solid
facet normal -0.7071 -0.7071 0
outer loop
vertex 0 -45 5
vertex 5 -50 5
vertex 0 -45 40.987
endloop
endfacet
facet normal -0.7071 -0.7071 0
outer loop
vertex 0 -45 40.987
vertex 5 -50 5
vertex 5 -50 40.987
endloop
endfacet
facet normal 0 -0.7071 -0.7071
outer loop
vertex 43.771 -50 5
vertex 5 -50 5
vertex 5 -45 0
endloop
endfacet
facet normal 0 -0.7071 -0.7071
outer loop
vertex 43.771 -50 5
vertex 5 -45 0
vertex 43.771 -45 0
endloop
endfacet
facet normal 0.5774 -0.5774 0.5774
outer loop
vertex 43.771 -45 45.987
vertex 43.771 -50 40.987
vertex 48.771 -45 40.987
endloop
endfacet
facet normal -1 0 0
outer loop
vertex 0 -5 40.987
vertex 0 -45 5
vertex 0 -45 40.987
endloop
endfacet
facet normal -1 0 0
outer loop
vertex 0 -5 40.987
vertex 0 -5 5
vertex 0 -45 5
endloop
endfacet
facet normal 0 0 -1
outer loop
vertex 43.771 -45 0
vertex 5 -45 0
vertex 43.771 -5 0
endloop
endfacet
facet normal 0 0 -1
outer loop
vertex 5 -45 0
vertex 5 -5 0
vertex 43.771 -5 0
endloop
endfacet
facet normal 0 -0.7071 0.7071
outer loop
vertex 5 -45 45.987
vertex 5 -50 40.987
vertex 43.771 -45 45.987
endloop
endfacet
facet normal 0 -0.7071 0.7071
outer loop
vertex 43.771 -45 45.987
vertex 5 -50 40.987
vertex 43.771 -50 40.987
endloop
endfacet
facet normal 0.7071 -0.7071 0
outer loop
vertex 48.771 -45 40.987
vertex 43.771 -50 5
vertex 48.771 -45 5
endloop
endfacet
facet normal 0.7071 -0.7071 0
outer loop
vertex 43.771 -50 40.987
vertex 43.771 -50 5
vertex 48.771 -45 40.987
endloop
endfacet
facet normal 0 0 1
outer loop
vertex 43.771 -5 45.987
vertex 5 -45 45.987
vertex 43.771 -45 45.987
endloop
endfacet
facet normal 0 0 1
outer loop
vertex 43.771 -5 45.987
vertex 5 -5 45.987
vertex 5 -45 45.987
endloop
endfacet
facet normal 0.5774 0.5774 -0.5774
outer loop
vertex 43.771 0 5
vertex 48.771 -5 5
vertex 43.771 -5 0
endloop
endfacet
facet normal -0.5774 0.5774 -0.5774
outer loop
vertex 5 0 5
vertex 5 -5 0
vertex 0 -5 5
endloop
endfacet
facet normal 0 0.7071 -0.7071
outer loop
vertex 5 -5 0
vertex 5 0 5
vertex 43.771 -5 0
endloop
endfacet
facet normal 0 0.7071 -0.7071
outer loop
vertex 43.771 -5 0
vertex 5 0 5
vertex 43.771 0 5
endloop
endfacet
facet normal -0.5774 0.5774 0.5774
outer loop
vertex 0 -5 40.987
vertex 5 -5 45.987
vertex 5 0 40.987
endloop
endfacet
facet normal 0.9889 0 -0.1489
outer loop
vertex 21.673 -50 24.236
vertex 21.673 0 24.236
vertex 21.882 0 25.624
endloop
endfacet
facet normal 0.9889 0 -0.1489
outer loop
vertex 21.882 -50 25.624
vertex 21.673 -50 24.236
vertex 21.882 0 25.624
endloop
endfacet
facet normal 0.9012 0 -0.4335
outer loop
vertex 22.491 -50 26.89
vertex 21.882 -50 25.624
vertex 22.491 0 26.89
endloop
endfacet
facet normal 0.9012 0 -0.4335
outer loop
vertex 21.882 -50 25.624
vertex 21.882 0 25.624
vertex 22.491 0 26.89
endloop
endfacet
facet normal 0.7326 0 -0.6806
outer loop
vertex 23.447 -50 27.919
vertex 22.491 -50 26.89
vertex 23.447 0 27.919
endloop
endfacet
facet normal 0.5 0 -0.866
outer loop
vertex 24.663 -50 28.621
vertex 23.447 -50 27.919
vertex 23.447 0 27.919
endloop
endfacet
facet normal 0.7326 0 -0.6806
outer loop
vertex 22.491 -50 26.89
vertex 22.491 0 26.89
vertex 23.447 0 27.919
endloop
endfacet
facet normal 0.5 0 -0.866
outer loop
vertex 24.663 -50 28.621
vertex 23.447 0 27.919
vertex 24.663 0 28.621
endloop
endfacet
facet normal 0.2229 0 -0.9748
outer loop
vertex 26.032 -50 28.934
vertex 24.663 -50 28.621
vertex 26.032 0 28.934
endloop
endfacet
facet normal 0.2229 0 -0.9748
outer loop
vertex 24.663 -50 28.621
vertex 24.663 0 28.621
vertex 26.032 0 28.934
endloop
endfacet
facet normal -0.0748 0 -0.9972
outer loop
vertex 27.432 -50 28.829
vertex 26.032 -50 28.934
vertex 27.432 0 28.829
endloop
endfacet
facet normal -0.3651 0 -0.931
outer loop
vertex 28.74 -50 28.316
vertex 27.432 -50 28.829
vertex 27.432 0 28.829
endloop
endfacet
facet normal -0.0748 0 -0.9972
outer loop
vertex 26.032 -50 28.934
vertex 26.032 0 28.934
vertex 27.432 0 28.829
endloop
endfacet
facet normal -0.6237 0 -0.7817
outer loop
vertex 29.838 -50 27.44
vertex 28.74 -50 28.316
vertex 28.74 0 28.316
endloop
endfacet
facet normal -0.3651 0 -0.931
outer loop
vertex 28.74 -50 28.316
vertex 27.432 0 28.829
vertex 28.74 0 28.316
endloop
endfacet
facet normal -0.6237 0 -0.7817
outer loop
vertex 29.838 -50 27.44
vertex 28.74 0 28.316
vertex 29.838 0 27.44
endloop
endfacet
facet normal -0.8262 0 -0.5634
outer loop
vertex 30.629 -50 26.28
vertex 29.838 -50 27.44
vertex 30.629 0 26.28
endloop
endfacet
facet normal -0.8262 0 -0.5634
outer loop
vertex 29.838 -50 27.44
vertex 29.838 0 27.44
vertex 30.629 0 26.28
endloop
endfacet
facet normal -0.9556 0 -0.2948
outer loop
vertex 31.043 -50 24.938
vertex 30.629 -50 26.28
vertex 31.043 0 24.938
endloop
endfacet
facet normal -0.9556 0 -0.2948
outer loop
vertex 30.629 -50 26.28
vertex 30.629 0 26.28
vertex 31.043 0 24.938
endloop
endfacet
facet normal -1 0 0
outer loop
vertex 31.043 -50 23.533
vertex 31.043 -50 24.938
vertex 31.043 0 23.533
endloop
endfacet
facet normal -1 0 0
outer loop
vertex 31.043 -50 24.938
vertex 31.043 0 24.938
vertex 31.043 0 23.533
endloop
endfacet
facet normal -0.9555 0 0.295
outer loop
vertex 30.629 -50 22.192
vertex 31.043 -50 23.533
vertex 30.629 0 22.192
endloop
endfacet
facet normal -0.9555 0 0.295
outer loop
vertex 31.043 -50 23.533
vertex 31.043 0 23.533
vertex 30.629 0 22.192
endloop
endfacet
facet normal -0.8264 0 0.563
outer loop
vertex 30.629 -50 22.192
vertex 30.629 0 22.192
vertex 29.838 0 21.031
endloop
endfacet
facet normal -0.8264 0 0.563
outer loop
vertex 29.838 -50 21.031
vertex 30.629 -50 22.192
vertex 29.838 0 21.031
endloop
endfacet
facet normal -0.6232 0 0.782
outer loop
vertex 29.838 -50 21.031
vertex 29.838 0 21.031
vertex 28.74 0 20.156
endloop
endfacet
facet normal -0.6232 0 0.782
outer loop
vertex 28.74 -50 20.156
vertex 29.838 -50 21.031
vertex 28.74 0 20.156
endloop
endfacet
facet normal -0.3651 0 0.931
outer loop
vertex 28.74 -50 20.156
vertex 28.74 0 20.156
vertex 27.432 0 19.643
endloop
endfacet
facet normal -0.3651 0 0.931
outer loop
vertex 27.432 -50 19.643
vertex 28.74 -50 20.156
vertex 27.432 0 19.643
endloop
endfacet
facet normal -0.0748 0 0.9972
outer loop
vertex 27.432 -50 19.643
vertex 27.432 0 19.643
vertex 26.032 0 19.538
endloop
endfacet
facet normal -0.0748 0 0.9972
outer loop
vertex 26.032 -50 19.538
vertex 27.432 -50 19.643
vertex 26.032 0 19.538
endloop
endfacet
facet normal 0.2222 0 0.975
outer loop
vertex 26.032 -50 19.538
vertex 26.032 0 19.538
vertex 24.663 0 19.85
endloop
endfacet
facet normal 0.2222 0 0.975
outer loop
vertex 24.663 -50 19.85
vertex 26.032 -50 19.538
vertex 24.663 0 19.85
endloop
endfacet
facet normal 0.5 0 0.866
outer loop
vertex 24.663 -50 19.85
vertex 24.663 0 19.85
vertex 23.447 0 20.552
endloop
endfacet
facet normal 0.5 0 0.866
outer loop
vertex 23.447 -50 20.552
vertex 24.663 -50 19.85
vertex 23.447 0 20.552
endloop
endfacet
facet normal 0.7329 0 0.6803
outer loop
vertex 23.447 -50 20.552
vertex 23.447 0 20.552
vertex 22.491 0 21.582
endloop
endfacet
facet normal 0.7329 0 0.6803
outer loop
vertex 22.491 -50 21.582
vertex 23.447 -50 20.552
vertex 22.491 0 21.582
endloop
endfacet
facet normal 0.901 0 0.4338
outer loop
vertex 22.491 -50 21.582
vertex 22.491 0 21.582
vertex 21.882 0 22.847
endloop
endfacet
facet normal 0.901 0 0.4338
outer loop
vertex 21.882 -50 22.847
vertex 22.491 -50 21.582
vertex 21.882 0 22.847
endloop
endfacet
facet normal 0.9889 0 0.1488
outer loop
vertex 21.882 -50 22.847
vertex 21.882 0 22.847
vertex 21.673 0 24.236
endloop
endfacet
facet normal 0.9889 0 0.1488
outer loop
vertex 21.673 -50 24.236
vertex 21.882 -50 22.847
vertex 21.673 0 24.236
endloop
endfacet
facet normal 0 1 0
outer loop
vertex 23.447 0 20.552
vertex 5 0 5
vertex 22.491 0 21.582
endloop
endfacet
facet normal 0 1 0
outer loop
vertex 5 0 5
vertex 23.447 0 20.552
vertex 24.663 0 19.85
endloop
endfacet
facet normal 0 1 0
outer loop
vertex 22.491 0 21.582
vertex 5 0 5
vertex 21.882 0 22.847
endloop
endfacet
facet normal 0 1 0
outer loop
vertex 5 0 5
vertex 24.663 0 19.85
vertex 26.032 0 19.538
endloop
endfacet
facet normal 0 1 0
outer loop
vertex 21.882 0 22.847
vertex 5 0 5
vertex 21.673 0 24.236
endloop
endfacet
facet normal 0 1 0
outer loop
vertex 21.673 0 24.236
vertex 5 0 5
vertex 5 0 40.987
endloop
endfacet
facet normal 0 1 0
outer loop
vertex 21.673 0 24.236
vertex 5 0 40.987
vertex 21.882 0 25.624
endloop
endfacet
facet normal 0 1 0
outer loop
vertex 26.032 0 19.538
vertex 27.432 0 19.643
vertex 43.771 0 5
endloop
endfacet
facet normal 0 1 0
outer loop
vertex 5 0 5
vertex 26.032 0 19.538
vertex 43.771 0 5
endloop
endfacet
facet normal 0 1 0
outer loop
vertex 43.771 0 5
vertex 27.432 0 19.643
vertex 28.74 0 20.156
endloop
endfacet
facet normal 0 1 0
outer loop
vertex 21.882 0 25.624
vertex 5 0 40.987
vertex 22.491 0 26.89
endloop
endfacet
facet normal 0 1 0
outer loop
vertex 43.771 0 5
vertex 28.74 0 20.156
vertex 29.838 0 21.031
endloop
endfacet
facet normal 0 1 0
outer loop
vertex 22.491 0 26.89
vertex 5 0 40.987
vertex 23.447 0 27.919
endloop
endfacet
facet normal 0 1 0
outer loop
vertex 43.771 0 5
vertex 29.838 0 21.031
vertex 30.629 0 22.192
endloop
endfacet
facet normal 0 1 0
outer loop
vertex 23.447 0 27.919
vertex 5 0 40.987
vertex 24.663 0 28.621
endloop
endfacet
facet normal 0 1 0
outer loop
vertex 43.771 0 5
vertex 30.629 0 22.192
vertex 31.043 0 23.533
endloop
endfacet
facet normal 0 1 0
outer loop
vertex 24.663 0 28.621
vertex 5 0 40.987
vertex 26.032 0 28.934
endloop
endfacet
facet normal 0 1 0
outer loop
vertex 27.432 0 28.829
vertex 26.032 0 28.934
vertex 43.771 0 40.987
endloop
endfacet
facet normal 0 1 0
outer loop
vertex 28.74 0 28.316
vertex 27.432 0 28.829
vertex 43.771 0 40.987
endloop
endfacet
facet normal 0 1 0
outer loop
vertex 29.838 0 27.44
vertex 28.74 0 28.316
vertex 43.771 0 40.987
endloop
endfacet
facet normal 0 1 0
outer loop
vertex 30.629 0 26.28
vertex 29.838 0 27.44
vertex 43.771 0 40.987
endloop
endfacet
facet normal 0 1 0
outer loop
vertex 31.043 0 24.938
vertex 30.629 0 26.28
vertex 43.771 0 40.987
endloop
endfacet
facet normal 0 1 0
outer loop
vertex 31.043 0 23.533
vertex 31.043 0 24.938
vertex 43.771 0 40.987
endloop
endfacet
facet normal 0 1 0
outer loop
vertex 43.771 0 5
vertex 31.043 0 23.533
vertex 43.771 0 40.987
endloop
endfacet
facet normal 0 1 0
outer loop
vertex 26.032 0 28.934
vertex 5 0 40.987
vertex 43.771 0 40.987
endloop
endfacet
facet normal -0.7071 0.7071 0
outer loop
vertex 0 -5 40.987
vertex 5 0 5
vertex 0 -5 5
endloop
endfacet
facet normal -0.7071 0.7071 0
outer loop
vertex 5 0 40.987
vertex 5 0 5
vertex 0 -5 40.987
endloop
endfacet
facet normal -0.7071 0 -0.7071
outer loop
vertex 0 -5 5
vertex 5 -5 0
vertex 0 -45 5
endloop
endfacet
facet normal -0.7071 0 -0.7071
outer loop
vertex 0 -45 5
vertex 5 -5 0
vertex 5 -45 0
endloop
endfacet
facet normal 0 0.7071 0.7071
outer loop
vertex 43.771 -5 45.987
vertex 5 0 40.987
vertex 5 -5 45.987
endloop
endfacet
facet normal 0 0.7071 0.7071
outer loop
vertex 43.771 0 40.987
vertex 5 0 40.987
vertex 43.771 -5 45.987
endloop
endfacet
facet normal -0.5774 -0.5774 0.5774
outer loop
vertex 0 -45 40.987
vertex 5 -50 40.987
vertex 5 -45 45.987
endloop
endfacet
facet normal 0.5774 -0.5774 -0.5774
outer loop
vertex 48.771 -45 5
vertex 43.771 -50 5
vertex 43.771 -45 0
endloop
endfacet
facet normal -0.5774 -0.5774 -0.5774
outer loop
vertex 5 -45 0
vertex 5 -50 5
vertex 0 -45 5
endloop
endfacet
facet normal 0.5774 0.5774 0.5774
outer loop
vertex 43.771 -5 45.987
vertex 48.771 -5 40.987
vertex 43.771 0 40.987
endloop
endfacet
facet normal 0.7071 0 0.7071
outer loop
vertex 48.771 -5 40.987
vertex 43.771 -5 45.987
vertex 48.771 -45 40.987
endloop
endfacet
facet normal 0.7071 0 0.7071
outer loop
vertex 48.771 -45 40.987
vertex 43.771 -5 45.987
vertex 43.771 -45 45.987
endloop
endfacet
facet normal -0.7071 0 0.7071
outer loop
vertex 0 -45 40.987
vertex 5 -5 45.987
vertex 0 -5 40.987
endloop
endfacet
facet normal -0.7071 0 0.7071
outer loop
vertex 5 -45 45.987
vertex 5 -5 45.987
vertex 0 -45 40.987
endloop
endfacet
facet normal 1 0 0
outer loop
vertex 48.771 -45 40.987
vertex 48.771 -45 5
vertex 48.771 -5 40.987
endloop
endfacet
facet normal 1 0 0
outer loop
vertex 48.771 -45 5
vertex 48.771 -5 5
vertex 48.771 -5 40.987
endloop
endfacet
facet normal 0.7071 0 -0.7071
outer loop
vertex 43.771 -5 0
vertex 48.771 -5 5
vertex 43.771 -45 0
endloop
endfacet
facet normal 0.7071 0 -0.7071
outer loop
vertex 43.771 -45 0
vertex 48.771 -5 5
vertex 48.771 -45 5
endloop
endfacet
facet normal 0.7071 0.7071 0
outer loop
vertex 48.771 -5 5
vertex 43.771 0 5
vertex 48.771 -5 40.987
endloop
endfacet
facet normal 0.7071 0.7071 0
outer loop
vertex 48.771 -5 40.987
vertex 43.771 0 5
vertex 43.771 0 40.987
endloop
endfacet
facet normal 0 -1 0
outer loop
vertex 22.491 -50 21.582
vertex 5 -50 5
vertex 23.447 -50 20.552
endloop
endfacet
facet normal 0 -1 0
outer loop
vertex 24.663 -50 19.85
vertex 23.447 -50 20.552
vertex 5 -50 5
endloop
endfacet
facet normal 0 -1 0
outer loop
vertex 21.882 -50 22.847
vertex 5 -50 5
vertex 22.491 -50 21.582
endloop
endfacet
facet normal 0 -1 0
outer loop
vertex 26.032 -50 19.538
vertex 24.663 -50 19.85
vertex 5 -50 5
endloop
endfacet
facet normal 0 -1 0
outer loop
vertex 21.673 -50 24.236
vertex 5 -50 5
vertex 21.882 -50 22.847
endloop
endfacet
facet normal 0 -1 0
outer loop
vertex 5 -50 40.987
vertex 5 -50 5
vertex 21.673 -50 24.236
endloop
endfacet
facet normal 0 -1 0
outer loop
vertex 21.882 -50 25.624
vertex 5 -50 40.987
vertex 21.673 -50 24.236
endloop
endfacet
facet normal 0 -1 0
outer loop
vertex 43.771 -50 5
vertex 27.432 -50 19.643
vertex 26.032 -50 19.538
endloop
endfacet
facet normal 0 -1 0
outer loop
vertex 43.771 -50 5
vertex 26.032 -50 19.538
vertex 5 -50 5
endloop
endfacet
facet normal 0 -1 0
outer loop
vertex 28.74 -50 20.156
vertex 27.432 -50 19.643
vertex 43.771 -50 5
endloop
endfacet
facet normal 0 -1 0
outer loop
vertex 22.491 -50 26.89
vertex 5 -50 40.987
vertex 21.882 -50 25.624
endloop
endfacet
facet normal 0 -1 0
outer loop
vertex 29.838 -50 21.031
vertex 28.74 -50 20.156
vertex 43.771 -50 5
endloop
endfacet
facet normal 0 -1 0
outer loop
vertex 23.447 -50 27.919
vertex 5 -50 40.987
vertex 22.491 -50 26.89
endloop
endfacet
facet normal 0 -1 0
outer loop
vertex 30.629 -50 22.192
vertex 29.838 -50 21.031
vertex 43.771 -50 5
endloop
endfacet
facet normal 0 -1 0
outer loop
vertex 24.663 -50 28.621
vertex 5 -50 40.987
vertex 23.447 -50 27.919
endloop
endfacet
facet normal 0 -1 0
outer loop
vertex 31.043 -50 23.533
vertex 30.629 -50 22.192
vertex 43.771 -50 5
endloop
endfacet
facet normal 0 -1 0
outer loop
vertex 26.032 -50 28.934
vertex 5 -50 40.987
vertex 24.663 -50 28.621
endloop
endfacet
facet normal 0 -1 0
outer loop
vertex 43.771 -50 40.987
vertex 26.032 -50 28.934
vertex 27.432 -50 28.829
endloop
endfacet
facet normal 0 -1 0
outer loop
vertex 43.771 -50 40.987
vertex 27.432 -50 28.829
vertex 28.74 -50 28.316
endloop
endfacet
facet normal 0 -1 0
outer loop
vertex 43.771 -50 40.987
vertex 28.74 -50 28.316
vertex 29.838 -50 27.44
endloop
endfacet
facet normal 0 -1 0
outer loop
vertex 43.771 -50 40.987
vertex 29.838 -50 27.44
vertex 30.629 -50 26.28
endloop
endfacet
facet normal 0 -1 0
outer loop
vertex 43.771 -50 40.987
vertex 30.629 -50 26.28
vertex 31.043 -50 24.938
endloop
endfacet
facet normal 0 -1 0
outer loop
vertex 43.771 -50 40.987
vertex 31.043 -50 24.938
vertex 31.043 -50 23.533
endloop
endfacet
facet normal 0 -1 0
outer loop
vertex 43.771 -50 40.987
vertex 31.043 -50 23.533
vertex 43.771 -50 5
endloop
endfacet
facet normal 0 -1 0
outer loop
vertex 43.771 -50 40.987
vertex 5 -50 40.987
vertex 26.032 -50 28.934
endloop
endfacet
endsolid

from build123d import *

# Parameters (mm, degrees)
F0_W     = 48.771314
F0_H     = 45.987077
F1_DEPTH = 50
F2_SIZE  = 5
F3_R     = 4.711226
F4_DEPTH = 50.001


with BuildPart() as f1:
    # F0 (on Front) → F1 (new body)
    with BuildSketch(Plane.XZ):
        with Locations((24.385657, 22.993538)):
            Rectangle(F0_W, F0_H)
    extrude(amount=F1_DEPTH)

    # F2
    f2_edges = [f1.edges().sort_by_distance(p)[0] for p in [
        (0, -50, 22.993539),
        (24.385657, -50, 0),
        (48.771314, -50, 22.993539),
        (24.385657, -50, 45.987077),
        (48.771314, -25, 0),
        (48.771314, -25, 45.987077),
        (48.771314, 0, 22.993539),
        (0, -25, 45.987077),
        (24.385657, 0, 45.987077),
        (0, -25, 0),
        (24.385657, 0, 0),
        (0, 0, 22.993539),
    ]]
    chamfer(f2_edges, length=F2_SIZE)

    # F3 (on face) → F4 (cut, through all)
    with BuildSketch(Plane(origin=(0, 0, 0), x_dir=(-1, 0, 0), z_dir=(0, 1, 0))):
        with Locations((-26.383946, 24.235671)):
            Circle(F3_R)
    extrude(amount=-F4_DEPTH, mode=Mode.SUBTRACT)


solid = f1.part
